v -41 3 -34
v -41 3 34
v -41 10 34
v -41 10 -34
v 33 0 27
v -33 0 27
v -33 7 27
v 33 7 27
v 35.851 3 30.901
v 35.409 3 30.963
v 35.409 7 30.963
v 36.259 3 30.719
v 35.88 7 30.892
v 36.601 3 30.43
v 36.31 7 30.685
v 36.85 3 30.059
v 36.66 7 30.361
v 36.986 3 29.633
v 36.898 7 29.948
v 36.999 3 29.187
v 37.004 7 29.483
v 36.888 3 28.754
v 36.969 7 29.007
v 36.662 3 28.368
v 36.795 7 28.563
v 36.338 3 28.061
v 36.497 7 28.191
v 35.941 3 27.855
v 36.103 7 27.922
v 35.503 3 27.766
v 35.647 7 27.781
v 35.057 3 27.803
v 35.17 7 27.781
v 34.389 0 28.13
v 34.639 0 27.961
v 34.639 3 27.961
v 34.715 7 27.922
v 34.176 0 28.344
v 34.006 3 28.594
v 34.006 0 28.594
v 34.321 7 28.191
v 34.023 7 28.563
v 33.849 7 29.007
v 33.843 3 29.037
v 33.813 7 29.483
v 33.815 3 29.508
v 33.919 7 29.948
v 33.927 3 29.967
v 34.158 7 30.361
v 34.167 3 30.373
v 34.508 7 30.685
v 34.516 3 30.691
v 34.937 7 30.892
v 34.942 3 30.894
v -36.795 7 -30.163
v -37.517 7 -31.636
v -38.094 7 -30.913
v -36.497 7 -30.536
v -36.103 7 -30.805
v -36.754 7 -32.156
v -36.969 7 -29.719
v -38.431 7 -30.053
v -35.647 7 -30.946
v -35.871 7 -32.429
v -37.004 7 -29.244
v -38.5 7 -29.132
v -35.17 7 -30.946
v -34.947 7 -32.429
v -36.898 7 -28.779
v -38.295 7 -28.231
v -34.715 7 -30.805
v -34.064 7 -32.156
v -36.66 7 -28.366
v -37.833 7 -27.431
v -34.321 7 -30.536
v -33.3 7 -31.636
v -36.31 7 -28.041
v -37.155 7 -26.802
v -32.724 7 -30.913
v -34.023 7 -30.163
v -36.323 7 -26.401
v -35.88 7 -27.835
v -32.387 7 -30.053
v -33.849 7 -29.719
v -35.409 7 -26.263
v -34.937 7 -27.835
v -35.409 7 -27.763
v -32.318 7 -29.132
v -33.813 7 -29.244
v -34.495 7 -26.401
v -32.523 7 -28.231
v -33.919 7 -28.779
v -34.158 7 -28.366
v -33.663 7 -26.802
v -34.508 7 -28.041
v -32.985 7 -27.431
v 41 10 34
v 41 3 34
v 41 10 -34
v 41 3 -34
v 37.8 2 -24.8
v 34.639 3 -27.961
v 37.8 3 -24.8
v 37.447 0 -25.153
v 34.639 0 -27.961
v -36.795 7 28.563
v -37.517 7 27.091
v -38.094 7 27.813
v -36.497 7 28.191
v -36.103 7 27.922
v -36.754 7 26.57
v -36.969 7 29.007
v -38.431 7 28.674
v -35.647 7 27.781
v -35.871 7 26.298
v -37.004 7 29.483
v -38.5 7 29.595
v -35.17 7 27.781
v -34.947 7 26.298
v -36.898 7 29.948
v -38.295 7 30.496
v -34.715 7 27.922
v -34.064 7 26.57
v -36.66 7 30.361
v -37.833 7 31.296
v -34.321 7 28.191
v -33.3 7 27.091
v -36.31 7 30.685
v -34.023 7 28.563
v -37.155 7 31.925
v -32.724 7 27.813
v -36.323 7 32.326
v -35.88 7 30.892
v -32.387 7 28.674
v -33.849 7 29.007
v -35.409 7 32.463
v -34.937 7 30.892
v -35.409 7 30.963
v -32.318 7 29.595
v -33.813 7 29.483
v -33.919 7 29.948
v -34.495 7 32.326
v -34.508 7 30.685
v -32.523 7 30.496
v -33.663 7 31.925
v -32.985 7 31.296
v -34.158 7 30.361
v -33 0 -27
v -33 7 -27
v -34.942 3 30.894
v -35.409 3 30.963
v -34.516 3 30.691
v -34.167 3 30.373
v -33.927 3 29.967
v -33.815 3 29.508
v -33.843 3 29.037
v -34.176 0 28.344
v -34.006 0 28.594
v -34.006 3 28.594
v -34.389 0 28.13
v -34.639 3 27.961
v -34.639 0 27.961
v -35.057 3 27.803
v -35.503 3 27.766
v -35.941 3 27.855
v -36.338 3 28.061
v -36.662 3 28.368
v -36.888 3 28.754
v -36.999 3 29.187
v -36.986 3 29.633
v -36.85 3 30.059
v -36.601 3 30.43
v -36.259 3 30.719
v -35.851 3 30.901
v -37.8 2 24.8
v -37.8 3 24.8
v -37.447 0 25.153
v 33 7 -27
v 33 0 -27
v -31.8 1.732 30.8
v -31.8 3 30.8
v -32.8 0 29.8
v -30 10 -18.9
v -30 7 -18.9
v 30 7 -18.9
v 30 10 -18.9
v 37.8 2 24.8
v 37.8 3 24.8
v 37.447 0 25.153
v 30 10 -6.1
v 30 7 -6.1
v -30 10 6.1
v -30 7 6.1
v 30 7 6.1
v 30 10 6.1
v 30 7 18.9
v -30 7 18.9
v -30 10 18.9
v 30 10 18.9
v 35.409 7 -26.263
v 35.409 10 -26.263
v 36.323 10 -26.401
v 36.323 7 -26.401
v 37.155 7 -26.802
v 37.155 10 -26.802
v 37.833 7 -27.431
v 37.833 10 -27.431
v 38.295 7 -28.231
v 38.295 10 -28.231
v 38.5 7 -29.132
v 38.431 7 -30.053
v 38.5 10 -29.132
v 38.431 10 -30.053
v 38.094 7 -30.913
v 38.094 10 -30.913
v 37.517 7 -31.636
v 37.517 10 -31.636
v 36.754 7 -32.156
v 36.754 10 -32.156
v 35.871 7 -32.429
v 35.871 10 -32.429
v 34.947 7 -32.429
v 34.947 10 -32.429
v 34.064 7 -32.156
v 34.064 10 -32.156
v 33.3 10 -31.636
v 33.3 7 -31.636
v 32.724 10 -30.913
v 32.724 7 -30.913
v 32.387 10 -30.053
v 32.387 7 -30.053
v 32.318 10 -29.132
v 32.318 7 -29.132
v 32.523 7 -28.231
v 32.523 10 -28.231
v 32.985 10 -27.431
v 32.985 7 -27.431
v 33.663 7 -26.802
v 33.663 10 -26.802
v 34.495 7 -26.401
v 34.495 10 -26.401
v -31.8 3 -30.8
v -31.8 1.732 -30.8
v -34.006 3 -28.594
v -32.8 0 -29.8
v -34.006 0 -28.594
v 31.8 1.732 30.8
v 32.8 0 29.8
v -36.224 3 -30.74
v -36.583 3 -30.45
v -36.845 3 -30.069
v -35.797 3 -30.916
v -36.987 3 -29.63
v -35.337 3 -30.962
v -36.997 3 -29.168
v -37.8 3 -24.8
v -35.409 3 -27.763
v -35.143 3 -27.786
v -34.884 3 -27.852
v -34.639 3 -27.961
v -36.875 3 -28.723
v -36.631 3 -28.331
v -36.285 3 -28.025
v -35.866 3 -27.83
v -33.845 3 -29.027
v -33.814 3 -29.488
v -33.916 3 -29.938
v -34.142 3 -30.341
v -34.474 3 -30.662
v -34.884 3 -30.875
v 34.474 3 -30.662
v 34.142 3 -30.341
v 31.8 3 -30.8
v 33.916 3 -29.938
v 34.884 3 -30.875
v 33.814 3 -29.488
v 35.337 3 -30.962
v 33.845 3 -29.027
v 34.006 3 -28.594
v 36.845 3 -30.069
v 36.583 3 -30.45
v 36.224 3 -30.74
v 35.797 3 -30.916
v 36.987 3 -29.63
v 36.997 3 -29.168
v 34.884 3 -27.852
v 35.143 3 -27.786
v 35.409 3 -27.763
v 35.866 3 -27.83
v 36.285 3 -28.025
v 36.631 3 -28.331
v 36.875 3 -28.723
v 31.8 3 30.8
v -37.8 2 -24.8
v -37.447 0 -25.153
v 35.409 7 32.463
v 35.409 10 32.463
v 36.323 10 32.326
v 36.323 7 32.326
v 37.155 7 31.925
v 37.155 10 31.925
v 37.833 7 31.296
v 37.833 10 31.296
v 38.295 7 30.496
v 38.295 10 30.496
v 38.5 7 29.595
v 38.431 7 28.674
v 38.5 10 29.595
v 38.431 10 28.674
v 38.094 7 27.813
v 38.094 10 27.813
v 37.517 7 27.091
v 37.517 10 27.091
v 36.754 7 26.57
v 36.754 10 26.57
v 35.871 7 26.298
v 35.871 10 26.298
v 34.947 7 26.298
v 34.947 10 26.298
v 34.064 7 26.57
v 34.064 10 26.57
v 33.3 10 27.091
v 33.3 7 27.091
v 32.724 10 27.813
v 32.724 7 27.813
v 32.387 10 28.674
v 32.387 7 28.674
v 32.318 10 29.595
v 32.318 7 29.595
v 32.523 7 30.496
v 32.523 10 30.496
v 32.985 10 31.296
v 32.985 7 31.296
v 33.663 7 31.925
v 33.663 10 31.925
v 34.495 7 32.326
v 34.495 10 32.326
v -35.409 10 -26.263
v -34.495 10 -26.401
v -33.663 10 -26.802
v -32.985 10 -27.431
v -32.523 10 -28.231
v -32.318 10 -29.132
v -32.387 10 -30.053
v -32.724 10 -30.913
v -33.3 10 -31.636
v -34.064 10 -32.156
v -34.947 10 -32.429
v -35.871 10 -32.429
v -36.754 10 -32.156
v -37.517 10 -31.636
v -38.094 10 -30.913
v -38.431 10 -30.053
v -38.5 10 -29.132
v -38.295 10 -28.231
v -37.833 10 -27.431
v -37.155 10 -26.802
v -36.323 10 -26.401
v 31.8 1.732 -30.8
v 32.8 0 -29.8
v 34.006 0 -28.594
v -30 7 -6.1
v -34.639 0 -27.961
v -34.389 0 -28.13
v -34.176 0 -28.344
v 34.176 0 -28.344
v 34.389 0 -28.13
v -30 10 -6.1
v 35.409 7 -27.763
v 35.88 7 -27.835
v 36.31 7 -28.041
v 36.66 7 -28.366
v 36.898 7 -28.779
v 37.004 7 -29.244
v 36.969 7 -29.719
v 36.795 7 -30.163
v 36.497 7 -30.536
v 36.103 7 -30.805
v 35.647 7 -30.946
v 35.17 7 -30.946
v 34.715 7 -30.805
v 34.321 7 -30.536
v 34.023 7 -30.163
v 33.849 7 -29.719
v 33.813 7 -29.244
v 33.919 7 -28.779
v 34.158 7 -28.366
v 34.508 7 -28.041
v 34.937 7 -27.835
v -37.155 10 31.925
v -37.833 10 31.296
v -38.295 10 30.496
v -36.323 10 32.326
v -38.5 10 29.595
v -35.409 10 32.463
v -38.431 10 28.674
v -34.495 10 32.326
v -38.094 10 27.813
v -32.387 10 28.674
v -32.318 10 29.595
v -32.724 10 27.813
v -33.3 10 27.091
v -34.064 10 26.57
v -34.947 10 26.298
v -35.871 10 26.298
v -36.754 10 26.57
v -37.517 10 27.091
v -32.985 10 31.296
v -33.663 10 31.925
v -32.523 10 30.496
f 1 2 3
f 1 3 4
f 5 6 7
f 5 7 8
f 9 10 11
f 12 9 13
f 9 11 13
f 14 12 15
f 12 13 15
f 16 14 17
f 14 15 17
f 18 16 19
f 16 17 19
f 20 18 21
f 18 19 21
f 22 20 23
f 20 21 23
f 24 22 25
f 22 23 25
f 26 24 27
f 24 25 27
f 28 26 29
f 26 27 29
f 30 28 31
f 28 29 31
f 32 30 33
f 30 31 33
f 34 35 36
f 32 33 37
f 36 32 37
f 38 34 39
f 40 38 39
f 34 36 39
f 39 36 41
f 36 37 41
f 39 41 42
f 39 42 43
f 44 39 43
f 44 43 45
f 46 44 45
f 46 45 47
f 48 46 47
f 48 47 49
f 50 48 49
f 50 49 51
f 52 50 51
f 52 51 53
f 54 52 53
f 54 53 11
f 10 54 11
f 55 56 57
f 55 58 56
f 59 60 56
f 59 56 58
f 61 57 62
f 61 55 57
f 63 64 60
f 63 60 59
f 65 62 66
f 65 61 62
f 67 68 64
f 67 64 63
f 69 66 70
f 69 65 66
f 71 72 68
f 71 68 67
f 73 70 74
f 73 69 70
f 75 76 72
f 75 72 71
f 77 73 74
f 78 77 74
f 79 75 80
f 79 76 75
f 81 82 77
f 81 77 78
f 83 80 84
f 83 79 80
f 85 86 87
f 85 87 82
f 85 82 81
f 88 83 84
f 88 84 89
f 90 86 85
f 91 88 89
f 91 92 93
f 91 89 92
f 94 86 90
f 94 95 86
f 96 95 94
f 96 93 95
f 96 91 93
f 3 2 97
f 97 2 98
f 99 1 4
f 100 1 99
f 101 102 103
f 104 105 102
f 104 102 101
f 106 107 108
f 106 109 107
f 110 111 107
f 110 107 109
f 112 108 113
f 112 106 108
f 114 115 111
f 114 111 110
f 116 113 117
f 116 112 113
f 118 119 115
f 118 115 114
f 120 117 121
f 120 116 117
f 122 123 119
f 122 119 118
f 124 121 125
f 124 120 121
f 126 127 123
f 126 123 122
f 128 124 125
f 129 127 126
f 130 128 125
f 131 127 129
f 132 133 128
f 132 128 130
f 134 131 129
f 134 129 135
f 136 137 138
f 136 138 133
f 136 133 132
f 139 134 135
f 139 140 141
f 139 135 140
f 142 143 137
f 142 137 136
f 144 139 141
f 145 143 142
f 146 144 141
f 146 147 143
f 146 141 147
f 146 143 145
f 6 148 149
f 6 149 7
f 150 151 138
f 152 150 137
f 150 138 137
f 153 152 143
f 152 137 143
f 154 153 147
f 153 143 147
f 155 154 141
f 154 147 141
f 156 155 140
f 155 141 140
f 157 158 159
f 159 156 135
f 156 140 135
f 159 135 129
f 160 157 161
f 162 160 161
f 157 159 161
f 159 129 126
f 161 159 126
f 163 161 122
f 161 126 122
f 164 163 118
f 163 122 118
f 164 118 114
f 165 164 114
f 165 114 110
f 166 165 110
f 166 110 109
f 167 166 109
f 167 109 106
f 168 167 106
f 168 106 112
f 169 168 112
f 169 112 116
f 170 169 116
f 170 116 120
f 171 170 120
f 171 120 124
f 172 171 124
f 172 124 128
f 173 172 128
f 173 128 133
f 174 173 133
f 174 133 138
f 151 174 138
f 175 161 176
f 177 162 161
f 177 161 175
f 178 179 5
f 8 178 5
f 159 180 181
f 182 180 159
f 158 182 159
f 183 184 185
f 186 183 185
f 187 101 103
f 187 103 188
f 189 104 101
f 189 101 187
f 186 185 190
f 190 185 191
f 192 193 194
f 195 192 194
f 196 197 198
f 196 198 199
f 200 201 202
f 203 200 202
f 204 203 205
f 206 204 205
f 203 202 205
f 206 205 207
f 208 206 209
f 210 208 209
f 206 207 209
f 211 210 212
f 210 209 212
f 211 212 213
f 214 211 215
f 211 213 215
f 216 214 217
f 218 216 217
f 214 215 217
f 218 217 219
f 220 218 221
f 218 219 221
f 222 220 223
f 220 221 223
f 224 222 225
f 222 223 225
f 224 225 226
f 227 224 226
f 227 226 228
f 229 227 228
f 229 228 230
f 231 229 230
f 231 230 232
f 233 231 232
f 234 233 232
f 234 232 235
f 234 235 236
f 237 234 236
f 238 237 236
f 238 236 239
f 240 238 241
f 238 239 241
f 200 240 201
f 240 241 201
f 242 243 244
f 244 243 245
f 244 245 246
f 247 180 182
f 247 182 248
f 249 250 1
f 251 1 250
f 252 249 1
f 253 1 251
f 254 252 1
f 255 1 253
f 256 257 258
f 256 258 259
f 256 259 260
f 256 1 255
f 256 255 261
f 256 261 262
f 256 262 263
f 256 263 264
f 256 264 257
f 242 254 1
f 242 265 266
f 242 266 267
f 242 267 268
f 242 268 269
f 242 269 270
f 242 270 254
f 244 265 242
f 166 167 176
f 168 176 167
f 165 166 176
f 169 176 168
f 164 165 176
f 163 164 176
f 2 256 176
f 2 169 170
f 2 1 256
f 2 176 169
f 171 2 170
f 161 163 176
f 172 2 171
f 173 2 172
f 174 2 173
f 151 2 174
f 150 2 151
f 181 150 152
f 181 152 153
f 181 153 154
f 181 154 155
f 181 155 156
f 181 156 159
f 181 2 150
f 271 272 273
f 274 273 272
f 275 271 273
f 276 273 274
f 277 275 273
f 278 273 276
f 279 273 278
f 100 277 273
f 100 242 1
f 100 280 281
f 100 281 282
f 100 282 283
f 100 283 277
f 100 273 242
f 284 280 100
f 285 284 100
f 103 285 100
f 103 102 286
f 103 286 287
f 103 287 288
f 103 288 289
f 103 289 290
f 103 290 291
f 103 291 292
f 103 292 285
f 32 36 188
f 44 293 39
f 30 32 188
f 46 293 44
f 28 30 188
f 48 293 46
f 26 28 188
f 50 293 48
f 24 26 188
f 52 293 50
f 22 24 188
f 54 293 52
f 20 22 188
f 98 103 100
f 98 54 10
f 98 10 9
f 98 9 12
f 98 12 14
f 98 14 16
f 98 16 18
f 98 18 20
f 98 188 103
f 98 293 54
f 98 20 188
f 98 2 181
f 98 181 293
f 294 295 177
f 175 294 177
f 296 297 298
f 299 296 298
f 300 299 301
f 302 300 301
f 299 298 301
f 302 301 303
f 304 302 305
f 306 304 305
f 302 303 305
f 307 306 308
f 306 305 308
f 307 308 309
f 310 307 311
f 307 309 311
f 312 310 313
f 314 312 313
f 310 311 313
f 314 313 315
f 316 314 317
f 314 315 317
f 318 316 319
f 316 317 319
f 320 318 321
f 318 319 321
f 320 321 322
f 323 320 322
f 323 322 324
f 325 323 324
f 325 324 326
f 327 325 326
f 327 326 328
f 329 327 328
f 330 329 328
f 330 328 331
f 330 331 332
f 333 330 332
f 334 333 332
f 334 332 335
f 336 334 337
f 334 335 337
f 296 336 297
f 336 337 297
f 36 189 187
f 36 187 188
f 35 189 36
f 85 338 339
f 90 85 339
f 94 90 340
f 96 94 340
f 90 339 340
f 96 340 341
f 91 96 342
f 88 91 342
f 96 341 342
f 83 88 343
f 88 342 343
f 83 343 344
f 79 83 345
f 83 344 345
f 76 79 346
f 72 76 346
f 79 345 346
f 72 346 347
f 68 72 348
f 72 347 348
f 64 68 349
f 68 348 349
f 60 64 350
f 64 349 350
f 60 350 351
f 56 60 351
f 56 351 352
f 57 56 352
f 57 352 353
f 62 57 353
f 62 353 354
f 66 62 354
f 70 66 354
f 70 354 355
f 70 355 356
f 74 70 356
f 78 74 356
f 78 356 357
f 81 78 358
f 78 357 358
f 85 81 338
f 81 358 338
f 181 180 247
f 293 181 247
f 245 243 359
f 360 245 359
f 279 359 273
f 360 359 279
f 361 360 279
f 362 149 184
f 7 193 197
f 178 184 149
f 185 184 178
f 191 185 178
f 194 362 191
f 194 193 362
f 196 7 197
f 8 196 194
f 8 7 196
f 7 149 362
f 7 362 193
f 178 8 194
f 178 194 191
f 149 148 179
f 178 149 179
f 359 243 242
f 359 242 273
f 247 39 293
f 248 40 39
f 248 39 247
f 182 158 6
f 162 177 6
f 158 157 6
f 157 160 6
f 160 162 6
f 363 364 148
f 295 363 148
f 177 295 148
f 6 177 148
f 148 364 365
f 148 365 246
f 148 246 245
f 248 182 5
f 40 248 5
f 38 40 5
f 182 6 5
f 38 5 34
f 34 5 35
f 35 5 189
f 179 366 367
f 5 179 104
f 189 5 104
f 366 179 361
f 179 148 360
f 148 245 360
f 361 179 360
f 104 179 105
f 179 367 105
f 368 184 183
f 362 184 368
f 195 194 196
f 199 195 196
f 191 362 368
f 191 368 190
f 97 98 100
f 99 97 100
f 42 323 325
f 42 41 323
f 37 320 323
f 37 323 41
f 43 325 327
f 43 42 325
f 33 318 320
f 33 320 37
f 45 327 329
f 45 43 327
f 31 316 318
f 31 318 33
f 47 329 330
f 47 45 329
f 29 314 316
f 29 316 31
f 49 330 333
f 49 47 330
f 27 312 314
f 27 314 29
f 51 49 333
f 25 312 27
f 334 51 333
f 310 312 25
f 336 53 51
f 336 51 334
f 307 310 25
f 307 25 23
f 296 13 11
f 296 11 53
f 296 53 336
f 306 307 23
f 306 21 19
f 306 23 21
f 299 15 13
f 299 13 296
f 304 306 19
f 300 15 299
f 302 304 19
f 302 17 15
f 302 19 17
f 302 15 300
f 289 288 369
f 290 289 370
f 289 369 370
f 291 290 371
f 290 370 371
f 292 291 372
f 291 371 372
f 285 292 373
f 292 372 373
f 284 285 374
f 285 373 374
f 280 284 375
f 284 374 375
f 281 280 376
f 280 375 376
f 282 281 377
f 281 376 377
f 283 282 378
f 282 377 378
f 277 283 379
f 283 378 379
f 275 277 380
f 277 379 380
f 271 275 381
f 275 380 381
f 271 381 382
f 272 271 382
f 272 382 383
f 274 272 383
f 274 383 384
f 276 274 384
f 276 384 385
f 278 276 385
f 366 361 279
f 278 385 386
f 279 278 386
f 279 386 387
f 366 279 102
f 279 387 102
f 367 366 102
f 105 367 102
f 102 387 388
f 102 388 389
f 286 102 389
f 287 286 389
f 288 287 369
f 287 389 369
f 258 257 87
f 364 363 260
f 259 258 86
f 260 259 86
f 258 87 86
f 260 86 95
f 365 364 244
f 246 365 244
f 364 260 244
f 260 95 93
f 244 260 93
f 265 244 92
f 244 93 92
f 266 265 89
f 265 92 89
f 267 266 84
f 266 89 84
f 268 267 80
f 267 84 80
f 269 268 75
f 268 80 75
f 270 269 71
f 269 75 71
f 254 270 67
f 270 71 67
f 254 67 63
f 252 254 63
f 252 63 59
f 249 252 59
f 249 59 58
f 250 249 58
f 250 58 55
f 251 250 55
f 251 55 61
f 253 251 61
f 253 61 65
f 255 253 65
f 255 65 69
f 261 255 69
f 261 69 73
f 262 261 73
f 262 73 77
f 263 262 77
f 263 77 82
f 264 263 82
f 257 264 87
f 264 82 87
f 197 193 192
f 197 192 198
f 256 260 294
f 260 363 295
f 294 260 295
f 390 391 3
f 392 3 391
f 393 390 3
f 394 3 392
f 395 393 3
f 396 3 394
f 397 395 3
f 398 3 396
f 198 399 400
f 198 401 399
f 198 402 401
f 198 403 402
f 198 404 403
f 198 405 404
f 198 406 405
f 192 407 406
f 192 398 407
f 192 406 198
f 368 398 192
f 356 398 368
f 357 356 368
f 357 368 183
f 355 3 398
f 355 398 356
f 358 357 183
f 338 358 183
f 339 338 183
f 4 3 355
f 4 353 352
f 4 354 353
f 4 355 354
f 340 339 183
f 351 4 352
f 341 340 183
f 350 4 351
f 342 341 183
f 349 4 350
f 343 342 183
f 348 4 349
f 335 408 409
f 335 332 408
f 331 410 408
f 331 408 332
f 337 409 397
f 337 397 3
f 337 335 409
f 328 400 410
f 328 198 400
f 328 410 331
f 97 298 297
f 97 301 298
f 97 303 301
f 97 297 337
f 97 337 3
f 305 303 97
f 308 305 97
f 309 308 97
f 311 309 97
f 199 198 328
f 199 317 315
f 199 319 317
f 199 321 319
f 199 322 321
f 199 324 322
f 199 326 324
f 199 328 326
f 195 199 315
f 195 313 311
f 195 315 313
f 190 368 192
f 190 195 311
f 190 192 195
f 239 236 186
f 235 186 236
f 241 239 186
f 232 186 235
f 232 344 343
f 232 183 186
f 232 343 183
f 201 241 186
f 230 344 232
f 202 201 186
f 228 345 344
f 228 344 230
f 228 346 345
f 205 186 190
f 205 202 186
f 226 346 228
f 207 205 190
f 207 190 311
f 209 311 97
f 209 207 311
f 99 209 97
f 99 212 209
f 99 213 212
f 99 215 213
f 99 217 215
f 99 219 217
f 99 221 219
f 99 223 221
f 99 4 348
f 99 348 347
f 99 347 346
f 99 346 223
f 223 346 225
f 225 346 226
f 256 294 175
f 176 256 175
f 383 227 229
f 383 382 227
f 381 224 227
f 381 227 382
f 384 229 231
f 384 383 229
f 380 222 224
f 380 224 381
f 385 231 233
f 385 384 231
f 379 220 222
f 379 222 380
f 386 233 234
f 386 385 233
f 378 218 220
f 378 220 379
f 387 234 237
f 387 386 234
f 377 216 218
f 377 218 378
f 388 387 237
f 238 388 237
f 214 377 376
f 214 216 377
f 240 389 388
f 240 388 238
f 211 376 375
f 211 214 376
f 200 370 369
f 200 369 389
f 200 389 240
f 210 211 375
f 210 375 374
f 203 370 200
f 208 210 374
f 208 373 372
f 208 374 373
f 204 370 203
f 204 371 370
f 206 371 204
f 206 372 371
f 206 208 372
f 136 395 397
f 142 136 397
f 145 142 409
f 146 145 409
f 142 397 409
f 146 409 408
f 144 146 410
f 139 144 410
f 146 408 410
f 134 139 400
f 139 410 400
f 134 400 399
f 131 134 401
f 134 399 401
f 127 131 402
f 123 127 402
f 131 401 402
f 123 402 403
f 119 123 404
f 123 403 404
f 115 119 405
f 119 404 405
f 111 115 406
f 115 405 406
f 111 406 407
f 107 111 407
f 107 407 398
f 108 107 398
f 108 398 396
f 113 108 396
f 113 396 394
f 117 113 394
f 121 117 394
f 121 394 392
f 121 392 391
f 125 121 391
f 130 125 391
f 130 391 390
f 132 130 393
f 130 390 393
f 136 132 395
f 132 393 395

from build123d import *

# Parameters (mm, degrees)
SKETCH1_W             = 76
SKETCH1_H             = 62
BOSS_EXTRUDE1_DEPTH   = 2
SKETCH2_W             = 82
SKETCH2_H             = 68
BOSS_EXTRUDE2_DEPTH   = 8
SKETCH3_W             = 60
SKETCH3_H             = 12.8
CUT_EXTRUDE1_DEPTH    = 11
SKETCH4_R             = 1.6
CUT_EXTRUDE2_DEPTH    = 11
SKETCH5_R             = 3.1
CUT_EXTRUDE3_DEPTH    = 3
SKETCH9_OUTSIDE_W     = 105.4
SKETCH9_OUTSIDE_H     = 91.4
SKETCH9_OUTSIDE_W_2   = 75.6
SKETCH9_OUTSIDE_H_2   = 61.6
CUT_EXTRUDE5_DEPTH    = 3
CUT_EXTRUDE6_DEPTH    = 3
SKETCH11_W            = 66
SKETCH11_H            = 54
CUT_EXTRUDE7_DEPTH    = 7
CHAMFER2_SIZE         = 2
CHAMFER2_SIZE2        = 0.352653961
CHAMFER2_PART_2_SIZE  = 2
CHAMFER2_PART_2_SIZE2 = 0.352653961
CHAMFER3_SIZE         = 1
CHAMFER3_SIZE2        = 1.732050808


with BuildPart() as part:
    # Sketch1 → Boss-Extrude1 (new body)
    with BuildSketch(Plane(origin=(0, 0, 0), x_dir=(1, 0, 0), z_dir=(0, 1, 0))):
        Rectangle(SKETCH1_W, SKETCH1_H)
    extrude(amount=BOSS_EXTRUDE1_DEPTH)

    # Sketch2 → Boss-Extrude2 (add)
    with BuildSketch(Plane(origin=(0, 2, 0), x_dir=(1, 0, 0), z_dir=(0, 1, 0))):
        Rectangle(SKETCH2_W, SKETCH2_H)
    extrude(amount=BOSS_EXTRUDE2_DEPTH)

    # Sketch3 → Cut-Extrude1 (cut, through all)
    with BuildSketch(Plane.XZ):
        with Locations((0, -12.5)):
            Rectangle(SKETCH3_W, SKETCH3_H)
        with Locations((0, 12.5)):
            Rectangle(SKETCH3_W, SKETCH3_H)
    extrude(amount=-CUT_EXTRUDE1_DEPTH, mode=Mode.SUBTRACT)

    # Sketch4 → Cut-Extrude2 (cut, through all)
    with BuildSketch(Plane(origin=(0, 10, 0), x_dir=(1, 0, 0), z_dir=(0, 1, 0))):
        with Locations(Location((-35.408866178, 29.363450001, 0), (0, 0, 270))):  # turned: the seam where the file's is
            Circle(SKETCH4_R)
        with Locations(Location((35.408866178, 29.363450001, 0), (0, 0, 270))):  # turned: the seam where the file's is
            Circle(SKETCH4_R)
        with Locations(Location((35.408866178, -29.363450001, 0), (0, 0, 270))):  # turned: the seam where the file's is
            Circle(SKETCH4_R)
        with Locations(Location((-35.408866178, -29.363450001, 0), (0, 0, 270))):  # turned: the seam where the file's is
            Circle(SKETCH4_R)
    extrude(amount=-CUT_EXTRUDE2_DEPTH, mode=Mode.SUBTRACT)

    # Sketch5 → Cut-Extrude3 (cut)
    with BuildSketch(Plane(origin=(0, 10, 0), x_dir=(1, 0, 0), z_dir=(0, 1, 0))):
        with Locations(Location((-35.408866178, 29.363450001, 0), (0, 0, 270))):  # turned: the seam where the file's is
            Circle(SKETCH5_R)
        with Locations(Location((35.408866178, 29.363450001, 0), (0, 0, 270))):  # turned: the seam where the file's is
            Circle(SKETCH5_R)
        with Locations(Location((35.408866178, -29.363450001, 0), (0, 0, 270))):  # turned: the seam where the file's is
            Circle(SKETCH5_R)
        with Locations(Location((-35.408866178, -29.363450001, 0), (0, 0, 270))):  # turned: the seam where the file's is
            Circle(SKETCH5_R)
    extrude(amount=-CUT_EXTRUDE3_DEPTH, mode=Mode.SUBTRACT)

    # Sketch9 outside → Cut-Extrude5 (cut)
    with BuildSketch(Plane.XZ):
        Rectangle(SKETCH9_OUTSIDE_W, SKETCH9_OUTSIDE_H)
        Rectangle(SKETCH9_OUTSIDE_W_2, SKETCH9_OUTSIDE_H_2, mode=Mode.SUBTRACT)
    extrude(amount=-CUT_EXTRUDE5_DEPTH, mode=Mode.SUBTRACT)

    # Sketch10 → Cut-Extrude6 (cut)
    with BuildSketch(Plane.XZ):
        Polygon((-37.8, -30.8), (-31.8, -30.8), (-37.8, -24.8), align=None)
        Polygon((-37.8, 24.8), (-37.8, 30.8), (-31.8, 30.8), align=None)
        Polygon((37.8, 30.8), (37.8, 24.8), (31.8, 30.8), align=None)
        Polygon((37.8, -30.8), (31.8, -30.8), (37.8, -24.8), align=None)
    extrude(amount=-CUT_EXTRUDE6_DEPTH, mode=Mode.SUBTRACT)

    # Sketch11 → Cut-Extrude7 (cut)
    with BuildSketch(Plane.XZ):
        Rectangle(SKETCH11_W, SKETCH11_H)
    extrude(amount=-CUT_EXTRUDE7_DEPTH, mode=Mode.SUBTRACT)

    # Chamfer2
    chamfer2_edges = [part.edges().sort_by_distance(p)[0] for p in [
        (37.8, 0, 0),
    ]]
    chamfer2_side = [part.faces().sort_by_distance(p)[0] for p in [
        (37.8, 1.5, 0),
    ]]
    chamfer(chamfer2_edges, length=CHAMFER2_SIZE, length2=CHAMFER2_SIZE2, reference=chamfer2_side[0])

    # Chamfer2 part 2
    chamfer2_part_2_edges = [part.edges().sort_by_distance(p)[0] for p in [
        (-37.8, 0, 0),
    ]]
    chamfer2_part_2_side = [part.faces().sort_by_distance(p)[0] for p in [
        (-37.8, 1.5, 0),
    ]]
    chamfer(chamfer2_part_2_edges, length=CHAMFER2_PART_2_SIZE, length2=CHAMFER2_PART_2_SIZE2, reference=chamfer2_part_2_side[0])

    # Chamfer3
    chamfer3_edges = [part.edges().sort_by_distance(p)[0] for p in [
        (0, 0, -30.8),
        (0, 0, 30.8),
    ]]
    chamfer3_side = [part.faces().sort_by_distance(p)[0] for p in [
        (-35.357643735, 0, 25.870950059),
    ]]
    chamfer(chamfer3_edges, length=CHAMFER3_SIZE, length2=CHAMFER3_SIZE2, reference=chamfer3_side[0])


solid = part.part
